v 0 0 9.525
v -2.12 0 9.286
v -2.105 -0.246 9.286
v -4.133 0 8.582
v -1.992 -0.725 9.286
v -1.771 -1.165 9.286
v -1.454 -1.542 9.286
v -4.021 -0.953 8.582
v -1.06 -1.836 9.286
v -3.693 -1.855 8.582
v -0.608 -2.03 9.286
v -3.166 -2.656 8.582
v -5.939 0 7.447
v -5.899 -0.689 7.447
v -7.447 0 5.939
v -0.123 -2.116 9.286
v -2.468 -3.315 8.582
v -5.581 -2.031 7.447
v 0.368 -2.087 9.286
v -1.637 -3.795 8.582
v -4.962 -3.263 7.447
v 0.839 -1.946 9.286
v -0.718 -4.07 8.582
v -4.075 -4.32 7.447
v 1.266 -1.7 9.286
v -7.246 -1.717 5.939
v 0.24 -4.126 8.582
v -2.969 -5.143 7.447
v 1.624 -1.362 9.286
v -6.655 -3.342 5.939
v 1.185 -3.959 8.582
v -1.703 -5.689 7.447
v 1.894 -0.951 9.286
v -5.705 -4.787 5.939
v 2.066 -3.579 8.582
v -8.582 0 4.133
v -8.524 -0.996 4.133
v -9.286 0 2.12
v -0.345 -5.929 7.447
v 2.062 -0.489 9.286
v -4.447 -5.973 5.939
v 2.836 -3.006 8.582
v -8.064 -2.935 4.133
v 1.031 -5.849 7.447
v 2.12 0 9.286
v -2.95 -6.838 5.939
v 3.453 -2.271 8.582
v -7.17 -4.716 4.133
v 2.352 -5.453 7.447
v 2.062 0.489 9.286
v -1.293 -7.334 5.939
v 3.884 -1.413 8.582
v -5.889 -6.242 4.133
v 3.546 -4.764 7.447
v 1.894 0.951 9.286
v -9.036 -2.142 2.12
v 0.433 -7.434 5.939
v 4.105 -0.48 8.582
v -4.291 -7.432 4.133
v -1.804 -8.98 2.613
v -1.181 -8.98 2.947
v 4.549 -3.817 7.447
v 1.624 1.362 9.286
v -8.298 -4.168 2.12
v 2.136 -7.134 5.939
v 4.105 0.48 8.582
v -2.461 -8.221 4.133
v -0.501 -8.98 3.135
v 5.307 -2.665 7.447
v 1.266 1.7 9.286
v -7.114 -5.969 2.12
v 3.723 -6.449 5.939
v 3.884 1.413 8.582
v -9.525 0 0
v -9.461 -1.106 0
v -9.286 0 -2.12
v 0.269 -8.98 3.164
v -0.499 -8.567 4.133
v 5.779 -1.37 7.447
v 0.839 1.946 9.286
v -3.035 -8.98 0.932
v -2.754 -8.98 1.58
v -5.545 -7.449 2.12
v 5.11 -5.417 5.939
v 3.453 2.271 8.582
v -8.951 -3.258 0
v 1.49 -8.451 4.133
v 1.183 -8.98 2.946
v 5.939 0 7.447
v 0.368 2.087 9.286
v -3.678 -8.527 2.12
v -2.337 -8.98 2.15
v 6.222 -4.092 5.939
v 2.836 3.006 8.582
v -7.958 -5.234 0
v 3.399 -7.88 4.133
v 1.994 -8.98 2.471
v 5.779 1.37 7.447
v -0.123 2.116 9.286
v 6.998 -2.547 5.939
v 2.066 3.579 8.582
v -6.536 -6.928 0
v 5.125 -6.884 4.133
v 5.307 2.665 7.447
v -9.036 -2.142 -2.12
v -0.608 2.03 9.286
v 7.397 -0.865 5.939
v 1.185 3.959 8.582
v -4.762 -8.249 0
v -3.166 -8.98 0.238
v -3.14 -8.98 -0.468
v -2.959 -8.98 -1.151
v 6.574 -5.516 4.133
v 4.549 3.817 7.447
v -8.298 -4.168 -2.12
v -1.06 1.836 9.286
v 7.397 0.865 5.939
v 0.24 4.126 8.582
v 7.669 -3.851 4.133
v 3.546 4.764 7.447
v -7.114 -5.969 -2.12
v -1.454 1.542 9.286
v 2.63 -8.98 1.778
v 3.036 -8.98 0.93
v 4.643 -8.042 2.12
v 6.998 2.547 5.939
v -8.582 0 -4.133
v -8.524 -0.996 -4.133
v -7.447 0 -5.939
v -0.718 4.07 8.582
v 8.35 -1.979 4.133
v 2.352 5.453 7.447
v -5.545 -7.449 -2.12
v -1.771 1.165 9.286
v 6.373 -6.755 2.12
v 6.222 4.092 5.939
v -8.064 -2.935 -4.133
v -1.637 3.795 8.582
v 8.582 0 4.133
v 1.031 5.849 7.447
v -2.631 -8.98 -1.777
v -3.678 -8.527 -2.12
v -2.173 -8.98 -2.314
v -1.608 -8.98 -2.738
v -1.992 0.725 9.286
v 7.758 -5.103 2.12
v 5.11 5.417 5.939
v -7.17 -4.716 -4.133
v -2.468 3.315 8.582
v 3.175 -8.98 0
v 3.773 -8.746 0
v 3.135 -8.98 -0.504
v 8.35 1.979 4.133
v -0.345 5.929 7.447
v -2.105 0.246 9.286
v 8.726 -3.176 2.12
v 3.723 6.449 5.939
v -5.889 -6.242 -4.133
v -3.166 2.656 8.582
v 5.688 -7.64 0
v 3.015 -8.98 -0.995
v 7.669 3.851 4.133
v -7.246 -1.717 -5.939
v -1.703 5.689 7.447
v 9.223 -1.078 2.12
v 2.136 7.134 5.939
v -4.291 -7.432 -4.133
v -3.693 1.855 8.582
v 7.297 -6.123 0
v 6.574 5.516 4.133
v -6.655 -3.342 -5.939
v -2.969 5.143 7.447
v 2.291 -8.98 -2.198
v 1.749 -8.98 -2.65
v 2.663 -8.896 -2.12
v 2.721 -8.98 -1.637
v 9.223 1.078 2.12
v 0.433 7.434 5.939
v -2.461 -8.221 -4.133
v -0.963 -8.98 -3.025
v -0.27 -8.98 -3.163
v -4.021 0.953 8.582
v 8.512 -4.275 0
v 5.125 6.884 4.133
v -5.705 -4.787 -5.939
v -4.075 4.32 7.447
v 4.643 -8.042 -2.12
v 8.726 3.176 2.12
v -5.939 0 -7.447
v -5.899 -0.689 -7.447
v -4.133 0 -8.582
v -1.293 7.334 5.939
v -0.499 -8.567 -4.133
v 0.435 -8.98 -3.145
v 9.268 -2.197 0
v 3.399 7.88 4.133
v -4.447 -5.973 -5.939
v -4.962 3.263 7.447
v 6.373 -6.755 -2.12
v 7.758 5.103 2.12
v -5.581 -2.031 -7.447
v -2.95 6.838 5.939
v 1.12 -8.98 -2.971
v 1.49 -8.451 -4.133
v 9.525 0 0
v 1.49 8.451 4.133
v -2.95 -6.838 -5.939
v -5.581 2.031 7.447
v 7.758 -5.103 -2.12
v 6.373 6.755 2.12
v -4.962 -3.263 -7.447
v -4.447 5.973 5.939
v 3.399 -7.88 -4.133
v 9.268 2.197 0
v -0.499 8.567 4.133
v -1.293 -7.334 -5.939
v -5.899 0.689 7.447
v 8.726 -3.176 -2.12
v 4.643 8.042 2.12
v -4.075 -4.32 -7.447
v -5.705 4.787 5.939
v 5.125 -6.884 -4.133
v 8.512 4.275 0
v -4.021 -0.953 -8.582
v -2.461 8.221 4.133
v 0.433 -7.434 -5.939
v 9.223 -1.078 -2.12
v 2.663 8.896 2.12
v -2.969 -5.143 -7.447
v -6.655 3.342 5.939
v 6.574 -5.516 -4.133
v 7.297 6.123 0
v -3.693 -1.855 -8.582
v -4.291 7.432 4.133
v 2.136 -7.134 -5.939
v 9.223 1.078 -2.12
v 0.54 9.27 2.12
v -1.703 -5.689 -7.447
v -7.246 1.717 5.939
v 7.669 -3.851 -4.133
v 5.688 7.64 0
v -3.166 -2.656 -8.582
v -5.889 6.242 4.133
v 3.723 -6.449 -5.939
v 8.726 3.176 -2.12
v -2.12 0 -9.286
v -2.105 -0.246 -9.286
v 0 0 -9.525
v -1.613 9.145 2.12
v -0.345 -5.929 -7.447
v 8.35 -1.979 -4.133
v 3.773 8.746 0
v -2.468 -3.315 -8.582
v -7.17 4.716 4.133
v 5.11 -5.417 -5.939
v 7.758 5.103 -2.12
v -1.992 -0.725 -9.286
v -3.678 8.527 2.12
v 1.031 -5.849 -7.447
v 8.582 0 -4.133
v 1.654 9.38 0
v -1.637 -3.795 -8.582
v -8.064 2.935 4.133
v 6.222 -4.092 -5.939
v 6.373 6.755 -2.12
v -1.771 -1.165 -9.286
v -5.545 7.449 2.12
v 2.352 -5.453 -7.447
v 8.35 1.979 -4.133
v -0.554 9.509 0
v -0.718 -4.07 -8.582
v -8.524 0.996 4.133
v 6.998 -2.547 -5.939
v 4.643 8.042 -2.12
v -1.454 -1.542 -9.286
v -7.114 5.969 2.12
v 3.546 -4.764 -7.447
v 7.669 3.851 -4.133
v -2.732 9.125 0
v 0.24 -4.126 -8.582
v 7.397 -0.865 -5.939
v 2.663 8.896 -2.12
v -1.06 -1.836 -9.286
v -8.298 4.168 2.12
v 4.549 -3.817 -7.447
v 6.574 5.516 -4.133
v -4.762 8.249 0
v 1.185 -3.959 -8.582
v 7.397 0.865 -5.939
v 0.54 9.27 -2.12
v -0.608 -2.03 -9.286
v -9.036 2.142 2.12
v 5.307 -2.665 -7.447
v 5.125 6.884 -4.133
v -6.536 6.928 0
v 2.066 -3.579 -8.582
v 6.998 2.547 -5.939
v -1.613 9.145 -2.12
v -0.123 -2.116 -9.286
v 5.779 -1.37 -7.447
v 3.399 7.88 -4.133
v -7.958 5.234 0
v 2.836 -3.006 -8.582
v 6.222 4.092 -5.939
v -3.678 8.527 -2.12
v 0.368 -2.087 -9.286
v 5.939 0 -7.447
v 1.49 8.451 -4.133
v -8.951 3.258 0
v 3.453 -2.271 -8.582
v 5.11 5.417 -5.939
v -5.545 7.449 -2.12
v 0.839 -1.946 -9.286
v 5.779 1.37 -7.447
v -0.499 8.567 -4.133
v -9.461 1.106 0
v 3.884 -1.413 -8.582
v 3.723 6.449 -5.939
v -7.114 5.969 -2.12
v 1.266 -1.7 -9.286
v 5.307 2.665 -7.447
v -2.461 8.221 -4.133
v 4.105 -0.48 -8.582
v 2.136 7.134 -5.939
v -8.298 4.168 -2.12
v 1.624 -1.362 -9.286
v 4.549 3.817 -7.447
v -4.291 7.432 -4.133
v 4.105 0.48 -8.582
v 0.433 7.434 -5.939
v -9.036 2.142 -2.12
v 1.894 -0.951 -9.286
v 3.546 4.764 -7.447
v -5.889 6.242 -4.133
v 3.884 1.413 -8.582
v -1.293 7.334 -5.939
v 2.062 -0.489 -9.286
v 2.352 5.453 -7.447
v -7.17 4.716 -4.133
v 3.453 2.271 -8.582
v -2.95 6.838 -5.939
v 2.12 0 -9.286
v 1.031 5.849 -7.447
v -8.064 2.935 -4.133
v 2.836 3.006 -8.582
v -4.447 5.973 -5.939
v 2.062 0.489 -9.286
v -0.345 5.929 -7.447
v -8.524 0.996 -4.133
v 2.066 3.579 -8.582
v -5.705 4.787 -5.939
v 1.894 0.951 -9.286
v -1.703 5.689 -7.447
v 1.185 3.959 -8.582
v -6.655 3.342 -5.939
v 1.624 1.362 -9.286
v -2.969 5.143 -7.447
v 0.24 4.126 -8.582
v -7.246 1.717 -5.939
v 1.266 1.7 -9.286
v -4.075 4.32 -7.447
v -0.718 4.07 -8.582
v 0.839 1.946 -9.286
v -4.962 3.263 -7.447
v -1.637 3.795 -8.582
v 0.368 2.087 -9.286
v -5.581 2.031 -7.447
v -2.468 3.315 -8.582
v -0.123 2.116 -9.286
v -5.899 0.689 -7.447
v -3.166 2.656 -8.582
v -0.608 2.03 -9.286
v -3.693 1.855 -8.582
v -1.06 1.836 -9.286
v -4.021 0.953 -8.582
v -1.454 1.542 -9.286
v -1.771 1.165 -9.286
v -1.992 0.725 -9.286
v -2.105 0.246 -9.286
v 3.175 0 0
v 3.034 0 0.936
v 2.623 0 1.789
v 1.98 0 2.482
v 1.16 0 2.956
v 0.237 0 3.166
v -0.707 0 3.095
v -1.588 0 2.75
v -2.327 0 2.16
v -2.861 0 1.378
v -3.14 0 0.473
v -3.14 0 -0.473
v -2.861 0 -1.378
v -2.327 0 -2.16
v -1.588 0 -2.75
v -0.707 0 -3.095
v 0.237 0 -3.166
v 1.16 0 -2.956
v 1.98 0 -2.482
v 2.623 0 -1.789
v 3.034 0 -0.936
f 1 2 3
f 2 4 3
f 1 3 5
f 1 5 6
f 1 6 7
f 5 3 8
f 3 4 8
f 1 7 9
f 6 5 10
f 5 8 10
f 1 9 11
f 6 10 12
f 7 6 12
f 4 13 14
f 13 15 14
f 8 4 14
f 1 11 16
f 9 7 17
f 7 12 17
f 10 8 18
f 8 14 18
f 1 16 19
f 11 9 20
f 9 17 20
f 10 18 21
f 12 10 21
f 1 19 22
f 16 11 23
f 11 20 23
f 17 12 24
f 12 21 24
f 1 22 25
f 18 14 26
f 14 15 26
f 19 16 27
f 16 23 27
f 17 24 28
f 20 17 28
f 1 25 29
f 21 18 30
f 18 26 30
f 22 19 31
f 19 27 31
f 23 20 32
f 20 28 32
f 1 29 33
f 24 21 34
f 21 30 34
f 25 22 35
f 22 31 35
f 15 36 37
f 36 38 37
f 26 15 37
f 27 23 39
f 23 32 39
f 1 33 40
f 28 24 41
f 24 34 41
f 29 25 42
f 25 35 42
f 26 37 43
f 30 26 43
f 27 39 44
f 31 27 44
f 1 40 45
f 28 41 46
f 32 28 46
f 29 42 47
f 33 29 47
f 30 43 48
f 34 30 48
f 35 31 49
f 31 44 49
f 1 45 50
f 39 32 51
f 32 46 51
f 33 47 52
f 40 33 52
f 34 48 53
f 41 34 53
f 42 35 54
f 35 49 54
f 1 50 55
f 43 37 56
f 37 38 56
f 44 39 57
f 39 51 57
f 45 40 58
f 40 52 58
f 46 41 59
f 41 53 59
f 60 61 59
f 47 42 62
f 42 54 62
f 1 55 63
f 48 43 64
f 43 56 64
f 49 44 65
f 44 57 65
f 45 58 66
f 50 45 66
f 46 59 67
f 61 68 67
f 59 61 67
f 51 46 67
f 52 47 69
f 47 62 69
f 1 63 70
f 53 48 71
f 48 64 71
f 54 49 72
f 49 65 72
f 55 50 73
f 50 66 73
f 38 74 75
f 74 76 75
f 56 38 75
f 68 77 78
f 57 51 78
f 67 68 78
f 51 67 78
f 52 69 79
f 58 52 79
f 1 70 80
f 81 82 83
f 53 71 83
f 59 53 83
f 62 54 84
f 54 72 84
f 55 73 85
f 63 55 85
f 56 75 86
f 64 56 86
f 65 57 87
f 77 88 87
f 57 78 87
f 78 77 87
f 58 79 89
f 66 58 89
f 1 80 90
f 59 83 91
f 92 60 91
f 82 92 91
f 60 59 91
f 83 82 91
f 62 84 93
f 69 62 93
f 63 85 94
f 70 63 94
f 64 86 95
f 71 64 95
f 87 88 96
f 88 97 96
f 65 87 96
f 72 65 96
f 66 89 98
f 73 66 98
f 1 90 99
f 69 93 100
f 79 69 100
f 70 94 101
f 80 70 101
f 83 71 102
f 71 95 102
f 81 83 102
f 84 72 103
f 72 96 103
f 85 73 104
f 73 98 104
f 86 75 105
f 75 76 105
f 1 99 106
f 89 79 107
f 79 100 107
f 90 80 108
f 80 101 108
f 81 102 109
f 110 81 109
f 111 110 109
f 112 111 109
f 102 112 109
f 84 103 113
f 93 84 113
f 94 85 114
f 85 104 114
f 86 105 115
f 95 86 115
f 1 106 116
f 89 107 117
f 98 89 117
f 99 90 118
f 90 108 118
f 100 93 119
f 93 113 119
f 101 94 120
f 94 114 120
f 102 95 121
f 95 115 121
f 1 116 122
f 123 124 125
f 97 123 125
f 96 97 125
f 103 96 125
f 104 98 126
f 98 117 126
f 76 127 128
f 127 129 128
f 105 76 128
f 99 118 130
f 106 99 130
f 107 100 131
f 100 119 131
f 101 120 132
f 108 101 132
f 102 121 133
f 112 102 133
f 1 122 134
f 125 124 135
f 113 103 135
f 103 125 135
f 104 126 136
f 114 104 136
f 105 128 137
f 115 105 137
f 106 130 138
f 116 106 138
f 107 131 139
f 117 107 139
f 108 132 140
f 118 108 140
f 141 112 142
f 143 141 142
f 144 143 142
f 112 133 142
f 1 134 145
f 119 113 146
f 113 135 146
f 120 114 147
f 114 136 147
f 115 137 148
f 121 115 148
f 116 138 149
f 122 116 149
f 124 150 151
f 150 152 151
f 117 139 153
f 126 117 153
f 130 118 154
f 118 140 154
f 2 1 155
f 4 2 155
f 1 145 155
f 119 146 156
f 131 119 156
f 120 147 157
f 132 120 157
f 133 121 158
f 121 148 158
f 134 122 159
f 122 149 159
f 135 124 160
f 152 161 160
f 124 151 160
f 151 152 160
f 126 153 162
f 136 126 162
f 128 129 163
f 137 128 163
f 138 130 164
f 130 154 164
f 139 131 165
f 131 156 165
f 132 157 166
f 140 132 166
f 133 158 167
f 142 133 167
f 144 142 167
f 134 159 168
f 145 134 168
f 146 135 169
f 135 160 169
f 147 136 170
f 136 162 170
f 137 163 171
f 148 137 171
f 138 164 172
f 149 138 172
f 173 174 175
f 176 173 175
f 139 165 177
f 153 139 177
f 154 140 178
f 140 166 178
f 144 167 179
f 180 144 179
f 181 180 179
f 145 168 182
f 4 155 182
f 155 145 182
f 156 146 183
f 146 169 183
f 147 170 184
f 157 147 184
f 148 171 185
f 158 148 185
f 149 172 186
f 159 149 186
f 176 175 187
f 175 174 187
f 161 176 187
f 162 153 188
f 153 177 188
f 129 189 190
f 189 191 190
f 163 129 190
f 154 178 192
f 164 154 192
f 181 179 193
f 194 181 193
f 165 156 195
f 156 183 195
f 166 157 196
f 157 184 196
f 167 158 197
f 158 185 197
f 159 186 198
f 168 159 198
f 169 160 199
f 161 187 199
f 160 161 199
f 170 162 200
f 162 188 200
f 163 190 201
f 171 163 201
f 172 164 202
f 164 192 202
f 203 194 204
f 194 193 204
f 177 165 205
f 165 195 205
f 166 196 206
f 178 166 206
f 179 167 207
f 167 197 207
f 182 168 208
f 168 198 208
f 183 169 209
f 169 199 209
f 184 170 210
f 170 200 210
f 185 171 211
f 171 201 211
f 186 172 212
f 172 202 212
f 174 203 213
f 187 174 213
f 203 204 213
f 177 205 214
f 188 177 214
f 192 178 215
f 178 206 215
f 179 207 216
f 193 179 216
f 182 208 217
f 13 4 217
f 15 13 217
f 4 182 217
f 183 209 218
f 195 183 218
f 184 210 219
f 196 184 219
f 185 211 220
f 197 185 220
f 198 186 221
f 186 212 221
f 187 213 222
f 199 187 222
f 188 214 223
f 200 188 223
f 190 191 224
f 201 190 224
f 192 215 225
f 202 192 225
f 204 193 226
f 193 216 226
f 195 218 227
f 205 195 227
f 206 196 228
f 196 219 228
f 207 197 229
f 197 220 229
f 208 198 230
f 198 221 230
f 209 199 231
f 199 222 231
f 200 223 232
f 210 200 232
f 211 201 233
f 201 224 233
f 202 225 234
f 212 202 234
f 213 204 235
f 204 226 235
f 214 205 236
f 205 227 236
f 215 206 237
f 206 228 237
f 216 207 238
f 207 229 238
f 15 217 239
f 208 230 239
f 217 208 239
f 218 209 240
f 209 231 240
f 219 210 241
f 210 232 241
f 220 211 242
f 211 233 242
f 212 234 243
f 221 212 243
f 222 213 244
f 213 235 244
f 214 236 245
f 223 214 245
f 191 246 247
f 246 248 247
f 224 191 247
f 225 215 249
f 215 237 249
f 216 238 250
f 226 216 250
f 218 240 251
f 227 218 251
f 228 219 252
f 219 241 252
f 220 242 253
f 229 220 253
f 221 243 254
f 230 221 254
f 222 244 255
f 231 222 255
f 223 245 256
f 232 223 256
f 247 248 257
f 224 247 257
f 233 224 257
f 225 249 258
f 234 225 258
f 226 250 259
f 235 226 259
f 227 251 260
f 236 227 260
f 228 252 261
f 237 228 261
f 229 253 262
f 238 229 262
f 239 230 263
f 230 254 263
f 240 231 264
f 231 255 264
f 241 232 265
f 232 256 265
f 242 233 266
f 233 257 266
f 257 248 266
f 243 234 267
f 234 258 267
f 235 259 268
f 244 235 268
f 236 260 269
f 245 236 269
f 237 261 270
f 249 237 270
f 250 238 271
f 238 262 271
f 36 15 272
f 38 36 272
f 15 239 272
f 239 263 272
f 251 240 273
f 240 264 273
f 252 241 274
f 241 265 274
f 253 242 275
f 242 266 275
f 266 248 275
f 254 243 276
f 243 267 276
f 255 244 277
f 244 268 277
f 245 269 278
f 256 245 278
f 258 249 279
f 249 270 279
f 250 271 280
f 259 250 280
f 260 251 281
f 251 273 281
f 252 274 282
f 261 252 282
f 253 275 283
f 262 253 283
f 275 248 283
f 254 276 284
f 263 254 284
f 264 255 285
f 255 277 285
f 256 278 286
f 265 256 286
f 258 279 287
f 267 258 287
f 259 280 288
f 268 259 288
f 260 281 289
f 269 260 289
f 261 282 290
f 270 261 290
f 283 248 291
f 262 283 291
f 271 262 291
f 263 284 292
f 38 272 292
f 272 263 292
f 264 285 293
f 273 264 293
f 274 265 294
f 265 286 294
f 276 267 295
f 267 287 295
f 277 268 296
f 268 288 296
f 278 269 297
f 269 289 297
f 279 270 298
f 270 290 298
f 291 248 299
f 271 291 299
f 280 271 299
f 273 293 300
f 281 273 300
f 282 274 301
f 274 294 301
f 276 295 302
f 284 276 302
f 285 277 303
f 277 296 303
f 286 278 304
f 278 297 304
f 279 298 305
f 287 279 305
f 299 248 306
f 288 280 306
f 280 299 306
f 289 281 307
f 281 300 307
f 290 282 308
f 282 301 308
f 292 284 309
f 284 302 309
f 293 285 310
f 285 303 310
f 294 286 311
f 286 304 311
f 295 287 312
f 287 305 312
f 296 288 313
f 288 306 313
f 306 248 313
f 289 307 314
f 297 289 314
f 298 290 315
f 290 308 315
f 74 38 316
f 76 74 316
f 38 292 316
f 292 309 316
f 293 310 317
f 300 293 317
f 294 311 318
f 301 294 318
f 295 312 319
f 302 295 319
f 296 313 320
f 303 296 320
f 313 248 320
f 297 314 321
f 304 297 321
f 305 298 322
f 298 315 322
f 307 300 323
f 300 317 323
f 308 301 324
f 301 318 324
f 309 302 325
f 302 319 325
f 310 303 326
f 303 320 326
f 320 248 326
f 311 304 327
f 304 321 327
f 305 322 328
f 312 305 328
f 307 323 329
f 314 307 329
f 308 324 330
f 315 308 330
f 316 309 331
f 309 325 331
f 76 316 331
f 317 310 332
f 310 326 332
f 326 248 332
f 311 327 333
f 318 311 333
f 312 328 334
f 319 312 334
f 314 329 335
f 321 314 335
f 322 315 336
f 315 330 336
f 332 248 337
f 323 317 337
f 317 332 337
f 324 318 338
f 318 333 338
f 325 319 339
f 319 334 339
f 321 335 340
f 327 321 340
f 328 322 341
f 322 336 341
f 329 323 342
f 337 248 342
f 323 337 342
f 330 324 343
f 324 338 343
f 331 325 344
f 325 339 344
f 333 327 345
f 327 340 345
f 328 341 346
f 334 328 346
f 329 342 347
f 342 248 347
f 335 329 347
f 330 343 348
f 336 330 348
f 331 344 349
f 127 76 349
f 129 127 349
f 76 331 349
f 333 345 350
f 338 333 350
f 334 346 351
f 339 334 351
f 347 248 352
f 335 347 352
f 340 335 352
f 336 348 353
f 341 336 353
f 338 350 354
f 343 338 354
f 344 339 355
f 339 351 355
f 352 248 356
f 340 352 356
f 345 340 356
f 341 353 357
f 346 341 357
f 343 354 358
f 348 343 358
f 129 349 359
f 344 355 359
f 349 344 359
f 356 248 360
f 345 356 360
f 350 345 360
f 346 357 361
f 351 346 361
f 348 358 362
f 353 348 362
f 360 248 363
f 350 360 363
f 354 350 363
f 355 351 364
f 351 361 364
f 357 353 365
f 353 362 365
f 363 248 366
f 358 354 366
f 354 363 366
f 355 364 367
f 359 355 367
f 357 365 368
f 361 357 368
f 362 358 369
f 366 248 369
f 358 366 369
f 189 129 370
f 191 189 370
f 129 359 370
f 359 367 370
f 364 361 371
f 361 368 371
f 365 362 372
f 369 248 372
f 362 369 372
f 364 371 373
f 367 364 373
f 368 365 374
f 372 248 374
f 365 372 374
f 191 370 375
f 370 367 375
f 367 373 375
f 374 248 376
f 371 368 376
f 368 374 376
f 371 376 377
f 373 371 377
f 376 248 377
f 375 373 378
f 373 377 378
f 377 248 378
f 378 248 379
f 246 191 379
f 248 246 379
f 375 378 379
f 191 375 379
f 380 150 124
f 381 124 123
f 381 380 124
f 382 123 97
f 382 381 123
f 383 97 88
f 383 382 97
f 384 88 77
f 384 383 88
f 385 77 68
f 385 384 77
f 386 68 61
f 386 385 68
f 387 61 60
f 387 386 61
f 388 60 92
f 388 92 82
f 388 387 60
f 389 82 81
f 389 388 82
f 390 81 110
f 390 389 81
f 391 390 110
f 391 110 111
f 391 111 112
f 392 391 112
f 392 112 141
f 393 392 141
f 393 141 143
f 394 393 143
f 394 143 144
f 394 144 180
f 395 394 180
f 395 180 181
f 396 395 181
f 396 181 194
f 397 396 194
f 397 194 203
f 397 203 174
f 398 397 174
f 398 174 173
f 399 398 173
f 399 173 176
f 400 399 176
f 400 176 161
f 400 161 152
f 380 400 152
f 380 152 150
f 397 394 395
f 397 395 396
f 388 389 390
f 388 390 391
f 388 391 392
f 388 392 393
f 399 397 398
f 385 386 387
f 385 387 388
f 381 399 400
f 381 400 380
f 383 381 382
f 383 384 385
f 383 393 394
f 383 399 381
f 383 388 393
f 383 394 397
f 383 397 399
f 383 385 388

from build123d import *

# Parameters (mm, degrees)
F3_R     = 3.175
F4_DEPTH = 25.4


with BuildPart() as f2:
    # F0 (on Front) → F2 (revolve)
    with BuildSketch(Plane.XZ):
        with BuildLine():
            Line((0, -9.525), (0, 9.525))
            ThreePointArc((0, 9.525), (-9.525, 0), (0, -9.525))
        make_face()
    revolve(axis=Axis((0, 0, 0), (0, 0, 1)))


with BuildPart() as f4:
    # F3 (on Front) → F4 (new body)
    with BuildSketch(Plane.XZ):
        Circle(F3_R)
    extrude(amount=F4_DEPTH)


with BuildPart() as f2_1:
    add(f2.part)

    # F5: cut F4
    add(f4.part, mode=Mode.SUBTRACT)


solid = f2_1.part
